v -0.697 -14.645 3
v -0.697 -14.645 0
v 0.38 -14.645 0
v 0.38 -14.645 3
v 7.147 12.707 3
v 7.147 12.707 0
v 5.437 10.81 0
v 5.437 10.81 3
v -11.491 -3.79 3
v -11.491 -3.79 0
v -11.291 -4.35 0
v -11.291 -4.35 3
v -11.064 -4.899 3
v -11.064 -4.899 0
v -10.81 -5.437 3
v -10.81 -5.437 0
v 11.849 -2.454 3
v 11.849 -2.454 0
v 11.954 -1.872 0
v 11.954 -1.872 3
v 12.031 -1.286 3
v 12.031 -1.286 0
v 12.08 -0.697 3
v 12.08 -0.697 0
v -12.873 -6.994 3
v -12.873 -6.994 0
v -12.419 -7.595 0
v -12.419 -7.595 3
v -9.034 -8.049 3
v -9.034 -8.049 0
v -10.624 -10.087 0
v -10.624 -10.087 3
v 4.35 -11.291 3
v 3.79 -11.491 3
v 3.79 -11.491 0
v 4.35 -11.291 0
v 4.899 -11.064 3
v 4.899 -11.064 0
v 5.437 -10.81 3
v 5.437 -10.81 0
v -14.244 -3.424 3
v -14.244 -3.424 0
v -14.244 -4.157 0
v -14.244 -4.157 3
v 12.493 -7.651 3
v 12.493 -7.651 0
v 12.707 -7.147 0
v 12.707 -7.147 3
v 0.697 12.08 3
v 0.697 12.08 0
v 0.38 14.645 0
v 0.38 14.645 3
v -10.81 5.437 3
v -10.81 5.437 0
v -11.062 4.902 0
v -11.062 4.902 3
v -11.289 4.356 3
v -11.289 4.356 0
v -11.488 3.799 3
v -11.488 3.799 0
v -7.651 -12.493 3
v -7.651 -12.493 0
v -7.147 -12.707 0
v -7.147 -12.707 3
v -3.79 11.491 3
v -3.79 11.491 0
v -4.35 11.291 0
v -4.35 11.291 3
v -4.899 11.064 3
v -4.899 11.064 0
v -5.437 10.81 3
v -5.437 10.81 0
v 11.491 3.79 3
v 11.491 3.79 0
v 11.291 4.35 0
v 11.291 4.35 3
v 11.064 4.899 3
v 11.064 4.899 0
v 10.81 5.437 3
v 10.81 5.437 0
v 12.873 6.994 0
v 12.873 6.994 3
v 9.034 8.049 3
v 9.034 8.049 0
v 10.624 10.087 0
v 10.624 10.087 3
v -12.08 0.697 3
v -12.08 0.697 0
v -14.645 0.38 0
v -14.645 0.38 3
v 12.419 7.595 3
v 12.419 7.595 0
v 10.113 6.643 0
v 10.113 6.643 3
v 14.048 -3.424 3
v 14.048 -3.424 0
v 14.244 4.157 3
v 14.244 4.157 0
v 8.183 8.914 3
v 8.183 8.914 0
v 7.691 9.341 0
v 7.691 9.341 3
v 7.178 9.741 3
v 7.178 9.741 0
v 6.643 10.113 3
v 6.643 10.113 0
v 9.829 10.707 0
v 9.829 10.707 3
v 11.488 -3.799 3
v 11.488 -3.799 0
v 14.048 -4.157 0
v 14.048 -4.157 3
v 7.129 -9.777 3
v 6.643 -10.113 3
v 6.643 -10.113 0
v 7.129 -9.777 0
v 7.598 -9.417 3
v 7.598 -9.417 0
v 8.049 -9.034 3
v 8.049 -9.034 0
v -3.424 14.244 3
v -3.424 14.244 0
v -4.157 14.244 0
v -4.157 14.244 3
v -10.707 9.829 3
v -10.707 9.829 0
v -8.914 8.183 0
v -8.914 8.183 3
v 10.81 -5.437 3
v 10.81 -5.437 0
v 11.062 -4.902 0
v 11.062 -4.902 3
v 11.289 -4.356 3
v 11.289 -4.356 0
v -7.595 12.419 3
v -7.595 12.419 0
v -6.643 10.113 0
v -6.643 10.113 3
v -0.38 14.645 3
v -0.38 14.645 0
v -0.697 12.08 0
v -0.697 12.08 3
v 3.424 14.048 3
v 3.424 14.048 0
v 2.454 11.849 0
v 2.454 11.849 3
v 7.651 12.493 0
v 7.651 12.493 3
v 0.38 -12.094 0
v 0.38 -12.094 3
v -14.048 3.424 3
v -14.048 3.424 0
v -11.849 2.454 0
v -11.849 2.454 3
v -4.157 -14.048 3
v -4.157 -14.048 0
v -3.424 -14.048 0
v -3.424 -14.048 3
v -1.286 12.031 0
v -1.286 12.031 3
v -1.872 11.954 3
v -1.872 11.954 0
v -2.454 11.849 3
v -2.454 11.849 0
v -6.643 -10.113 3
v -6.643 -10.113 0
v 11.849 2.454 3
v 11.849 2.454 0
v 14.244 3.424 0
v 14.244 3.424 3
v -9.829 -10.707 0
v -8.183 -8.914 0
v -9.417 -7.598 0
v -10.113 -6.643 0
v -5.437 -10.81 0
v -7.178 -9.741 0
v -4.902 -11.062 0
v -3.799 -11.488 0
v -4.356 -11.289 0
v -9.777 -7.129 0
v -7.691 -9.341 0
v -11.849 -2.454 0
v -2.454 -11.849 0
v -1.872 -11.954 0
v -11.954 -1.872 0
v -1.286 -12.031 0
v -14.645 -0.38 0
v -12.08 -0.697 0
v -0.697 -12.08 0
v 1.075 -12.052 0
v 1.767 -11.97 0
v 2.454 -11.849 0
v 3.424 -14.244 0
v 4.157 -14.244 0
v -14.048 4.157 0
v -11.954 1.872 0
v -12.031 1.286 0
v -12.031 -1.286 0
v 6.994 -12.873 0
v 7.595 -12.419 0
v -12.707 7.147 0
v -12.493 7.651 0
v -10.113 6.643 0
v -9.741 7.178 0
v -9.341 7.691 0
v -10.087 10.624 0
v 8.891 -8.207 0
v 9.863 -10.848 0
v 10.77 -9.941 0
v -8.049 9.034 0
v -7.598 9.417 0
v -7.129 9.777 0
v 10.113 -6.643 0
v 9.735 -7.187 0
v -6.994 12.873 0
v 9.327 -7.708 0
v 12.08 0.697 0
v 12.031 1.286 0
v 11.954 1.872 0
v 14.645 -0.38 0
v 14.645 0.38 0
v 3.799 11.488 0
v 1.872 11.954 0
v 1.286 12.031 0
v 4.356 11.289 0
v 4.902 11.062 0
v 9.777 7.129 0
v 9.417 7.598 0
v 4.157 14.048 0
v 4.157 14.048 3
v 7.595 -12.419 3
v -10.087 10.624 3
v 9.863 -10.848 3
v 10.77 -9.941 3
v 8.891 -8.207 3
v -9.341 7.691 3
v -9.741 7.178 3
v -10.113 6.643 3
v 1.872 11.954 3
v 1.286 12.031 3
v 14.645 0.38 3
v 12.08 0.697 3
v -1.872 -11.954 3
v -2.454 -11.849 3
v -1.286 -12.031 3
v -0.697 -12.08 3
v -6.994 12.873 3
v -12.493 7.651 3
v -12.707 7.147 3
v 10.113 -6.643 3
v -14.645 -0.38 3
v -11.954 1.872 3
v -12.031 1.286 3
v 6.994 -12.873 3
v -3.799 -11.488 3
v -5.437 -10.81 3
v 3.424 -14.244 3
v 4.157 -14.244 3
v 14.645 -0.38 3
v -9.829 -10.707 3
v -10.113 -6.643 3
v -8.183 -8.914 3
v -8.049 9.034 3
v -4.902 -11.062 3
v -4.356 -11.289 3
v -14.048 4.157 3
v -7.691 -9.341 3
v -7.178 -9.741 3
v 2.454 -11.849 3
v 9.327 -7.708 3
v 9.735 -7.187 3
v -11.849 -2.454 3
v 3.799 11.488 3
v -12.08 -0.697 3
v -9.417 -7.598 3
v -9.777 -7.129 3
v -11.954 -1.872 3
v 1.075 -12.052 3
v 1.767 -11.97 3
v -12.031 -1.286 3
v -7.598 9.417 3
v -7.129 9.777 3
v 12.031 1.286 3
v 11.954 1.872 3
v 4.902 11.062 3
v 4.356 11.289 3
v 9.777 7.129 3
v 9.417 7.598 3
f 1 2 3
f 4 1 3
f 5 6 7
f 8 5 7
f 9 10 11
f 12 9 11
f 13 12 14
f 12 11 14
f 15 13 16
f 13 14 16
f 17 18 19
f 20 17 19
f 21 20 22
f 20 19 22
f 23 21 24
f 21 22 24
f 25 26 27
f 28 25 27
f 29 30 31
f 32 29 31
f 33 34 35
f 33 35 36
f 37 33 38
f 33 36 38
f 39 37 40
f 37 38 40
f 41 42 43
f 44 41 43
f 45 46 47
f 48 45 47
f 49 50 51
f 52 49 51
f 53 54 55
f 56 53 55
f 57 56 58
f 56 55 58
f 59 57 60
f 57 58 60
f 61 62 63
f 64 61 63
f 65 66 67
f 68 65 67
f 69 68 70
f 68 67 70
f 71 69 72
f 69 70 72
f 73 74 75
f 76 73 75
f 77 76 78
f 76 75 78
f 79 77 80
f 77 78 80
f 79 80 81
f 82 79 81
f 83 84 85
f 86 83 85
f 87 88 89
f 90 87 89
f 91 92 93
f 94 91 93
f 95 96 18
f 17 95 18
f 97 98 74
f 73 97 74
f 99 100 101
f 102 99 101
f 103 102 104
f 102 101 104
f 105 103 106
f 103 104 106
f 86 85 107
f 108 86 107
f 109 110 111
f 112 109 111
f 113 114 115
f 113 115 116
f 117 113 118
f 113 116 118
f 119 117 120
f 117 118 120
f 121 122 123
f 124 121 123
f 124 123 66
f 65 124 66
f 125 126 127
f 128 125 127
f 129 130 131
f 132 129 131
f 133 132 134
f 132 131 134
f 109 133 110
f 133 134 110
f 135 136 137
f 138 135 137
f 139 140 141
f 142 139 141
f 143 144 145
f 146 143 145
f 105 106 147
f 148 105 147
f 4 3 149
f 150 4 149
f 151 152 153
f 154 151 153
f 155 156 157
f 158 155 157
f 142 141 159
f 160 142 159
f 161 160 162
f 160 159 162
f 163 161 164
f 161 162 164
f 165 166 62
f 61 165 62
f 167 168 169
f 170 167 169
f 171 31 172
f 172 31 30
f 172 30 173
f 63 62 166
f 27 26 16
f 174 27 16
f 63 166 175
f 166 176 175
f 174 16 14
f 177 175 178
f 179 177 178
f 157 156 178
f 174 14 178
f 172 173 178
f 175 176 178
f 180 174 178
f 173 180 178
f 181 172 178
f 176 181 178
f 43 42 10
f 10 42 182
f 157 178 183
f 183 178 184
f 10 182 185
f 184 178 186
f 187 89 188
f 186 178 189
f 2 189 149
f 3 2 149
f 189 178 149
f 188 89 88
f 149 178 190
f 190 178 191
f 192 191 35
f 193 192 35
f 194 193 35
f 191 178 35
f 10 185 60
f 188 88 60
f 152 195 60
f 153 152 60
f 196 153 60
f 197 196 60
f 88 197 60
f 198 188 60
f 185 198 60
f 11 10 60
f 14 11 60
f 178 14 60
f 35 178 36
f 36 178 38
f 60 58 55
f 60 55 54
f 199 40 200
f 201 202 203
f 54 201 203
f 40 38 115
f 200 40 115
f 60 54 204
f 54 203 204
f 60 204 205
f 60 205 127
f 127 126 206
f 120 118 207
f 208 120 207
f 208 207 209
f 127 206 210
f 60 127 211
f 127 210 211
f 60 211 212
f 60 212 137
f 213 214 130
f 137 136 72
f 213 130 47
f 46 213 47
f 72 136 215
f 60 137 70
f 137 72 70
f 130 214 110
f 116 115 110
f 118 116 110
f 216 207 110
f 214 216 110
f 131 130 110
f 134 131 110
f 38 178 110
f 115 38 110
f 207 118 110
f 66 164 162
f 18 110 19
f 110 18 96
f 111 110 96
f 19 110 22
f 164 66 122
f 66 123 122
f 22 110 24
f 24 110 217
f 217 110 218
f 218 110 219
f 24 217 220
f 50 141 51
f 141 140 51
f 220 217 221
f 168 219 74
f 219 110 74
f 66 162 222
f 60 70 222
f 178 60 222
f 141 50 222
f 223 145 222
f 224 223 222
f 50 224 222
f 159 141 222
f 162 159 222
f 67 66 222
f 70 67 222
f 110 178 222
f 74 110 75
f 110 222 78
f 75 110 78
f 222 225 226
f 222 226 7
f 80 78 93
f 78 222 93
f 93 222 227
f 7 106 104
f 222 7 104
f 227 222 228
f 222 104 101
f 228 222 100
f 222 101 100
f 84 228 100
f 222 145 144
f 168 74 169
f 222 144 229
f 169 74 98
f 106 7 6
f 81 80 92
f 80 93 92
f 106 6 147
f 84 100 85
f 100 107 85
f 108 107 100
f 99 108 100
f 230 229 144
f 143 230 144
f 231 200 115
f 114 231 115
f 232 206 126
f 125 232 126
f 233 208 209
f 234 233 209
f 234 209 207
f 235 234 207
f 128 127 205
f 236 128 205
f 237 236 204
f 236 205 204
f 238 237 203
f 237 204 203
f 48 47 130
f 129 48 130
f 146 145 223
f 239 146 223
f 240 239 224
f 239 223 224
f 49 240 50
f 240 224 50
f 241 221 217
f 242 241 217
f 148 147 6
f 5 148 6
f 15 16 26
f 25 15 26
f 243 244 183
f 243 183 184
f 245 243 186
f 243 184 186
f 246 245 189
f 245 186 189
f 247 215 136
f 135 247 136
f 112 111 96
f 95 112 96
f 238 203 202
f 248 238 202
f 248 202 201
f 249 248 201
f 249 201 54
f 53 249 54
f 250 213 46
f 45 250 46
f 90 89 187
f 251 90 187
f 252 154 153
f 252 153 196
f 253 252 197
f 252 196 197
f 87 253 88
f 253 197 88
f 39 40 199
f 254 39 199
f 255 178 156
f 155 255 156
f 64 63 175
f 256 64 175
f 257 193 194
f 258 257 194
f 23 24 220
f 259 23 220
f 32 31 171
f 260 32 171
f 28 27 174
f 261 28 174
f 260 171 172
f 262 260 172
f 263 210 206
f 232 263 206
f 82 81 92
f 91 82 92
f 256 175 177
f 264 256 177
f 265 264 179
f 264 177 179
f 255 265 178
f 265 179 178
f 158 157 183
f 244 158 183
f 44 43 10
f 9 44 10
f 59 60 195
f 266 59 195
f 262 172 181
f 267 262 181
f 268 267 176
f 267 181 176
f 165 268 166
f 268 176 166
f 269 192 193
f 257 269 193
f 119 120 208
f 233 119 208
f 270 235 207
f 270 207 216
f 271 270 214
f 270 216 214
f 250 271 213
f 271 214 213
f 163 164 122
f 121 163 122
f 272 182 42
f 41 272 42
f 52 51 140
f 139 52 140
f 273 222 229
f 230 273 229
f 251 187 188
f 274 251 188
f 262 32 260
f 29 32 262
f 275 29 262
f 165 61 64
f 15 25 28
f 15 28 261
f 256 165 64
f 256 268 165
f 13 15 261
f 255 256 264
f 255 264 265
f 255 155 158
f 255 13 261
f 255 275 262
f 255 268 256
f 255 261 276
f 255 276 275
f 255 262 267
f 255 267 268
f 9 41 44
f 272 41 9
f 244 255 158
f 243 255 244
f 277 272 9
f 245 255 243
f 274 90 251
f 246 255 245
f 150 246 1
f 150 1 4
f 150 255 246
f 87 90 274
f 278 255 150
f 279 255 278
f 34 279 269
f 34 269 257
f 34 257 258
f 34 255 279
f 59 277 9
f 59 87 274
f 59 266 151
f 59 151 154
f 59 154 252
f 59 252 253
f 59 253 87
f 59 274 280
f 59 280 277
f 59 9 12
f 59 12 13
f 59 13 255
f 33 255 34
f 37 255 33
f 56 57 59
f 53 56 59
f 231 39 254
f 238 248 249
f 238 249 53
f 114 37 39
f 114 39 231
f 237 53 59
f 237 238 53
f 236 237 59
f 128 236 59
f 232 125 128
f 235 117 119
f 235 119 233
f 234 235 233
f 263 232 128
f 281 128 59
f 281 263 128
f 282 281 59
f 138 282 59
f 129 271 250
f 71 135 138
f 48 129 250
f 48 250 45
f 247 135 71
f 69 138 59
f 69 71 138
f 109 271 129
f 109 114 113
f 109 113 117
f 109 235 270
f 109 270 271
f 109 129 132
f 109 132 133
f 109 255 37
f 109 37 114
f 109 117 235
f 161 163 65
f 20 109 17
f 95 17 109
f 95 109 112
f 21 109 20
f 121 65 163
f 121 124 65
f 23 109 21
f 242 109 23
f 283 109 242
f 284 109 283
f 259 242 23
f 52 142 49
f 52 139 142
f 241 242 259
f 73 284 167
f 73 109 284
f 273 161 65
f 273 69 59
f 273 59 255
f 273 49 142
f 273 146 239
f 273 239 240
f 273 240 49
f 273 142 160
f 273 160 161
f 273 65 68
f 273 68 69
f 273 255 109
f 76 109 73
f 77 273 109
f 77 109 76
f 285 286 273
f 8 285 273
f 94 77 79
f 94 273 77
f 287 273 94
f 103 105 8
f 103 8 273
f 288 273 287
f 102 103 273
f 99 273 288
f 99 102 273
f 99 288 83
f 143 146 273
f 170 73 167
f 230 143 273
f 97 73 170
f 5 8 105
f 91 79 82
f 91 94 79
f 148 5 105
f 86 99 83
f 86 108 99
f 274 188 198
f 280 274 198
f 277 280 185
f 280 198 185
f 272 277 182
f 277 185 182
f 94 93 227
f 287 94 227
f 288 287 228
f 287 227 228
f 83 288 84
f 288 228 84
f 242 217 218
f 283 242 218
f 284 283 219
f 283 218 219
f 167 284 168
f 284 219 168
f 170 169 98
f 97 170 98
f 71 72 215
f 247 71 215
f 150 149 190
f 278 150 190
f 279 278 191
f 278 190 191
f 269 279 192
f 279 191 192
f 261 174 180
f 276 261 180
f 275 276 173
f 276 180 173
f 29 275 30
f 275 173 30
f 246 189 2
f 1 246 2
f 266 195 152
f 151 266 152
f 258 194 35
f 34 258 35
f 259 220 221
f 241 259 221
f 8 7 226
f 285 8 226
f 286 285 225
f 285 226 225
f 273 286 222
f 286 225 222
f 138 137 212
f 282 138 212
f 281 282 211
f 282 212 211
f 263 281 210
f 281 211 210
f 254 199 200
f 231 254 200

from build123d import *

# Parameters (mm, degrees)
SKETCH1_R            = 12.1
BOSS_EXTRUDE1_DEPTH  = 3
BOSS_EXTRUDE2_DEPTH  = 3
BOSS_EXTRUDE3_DEPTH  = 3
BOSS_EXTRUDE4_DEPTH  = 3
BOSS_EXTRUDE5_DEPTH  = 3
BOSS_EXTRUDE6_DEPTH  = 3
BOSS_EXTRUDE7_DEPTH  = 3
BOSS_EXTRUDE8_DEPTH  = 3
BOSS_EXTRUDE9_DEPTH  = 3
BOSS_EXTRUDE10_DEPTH = 3
BOSS_EXTRUDE11_DEPTH = 3
BOSS_EXTRUDE12_DEPTH = 3
BOSS_EXTRUDE13_DEPTH = 3
BOSS_EXTRUDE14_DEPTH = 3
BOSS_EXTRUDE15_DEPTH = 3
BOSS_EXTRUDE16_DEPTH = 3
BOSS_EXTRUDE17_DEPTH = 3
BOSS_EXTRUDE18_DEPTH = 3
BOSS_EXTRUDE19_DEPTH = 3
BOSS_EXTRUDE20_DEPTH = 3
BOSS_EXTRUDE21_DEPTH = 3
BOSS_EXTRUDE22_DEPTH = 3
BOSS_EXTRUDE23_DEPTH = 3
BOSS_EXTRUDE24_DEPTH = 3
BOSS_EXTRUDE25_DEPTH = 3


with BuildPart() as part:
    # Sketch1 → Boss-Extrude1 (new body)
    with BuildSketch(Plane.XY):
        Circle(SKETCH1_R)
    extrude(amount=BOSS_EXTRUDE1_DEPTH)

    # Sketch2 → Boss-Extrude2 (add)
    with BuildSketch(Plane.XY):
        Polygon((12.079935981, -0.696524726), (14.645079707, -0.379658233), (14.645079707, 0.379658233), (12.079935981, 0.696524726), align=None)
    extrude(amount=BOSS_EXTRUDE2_DEPTH)

    # Sketch3 → Boss-Extrude3 (add)
    with BuildSketch(Plane.XY):
        Polygon((11.848596009, 2.453726274), (14.244323498, 3.423703853), (14.244323498, 4.157147238), (11.490982299, 3.790425545), align=None)
    extrude(amount=BOSS_EXTRUDE3_DEPTH)

    # Sketch4 → Boss-Extrude4 (add)
    with BuildSketch(Plane.XY):
        Polygon((10.809793799, 5.436759883), (12.872840183, 6.993746179), (12.418878698, 7.595256676), (10.113269073, 6.643176098), align=None)
    extrude(amount=BOSS_EXTRUDE4_DEPTH)

    # Sketch5 → Boss-Extrude5 (add)
    with BuildSketch(Plane.XY):
        Polygon((9.034322006, 8.049287291), (10.624094083, 10.087176261), (9.829208044, 10.707272668), (8.182693208, 8.913671065), align=None)
    extrude(amount=BOSS_EXTRUDE5_DEPTH)

    # Sketch6 → Boss-Extrude6 (add)
    with BuildSketch(Plane.XY):
        Polygon((6.643176098, 10.113269073), (7.651333528, 12.49318195), (7.147254813, 12.706715272), (5.436759883, 10.809793799), align=None)
    extrude(amount=BOSS_EXTRUDE6_DEPTH)

    # Sketch7 → Boss-Extrude7 (add)
    with BuildSketch(Plane.XY):
        Polygon((3.799308717, 11.488048279), (4.157147238, 14.047797936), (3.423703853, 14.047797936), (2.453726274, 11.848596009), align=None)
    extrude(amount=BOSS_EXTRUDE7_DEPTH)

    # Sketch8 → Boss-Extrude8 (add)
    with BuildSketch(Plane.XY):
        Polygon((0.696524726, 12.079935981), (0.379658233, 14.645079707), (-0.379658233, 14.645079707), (-0.696524726, 12.079935981), align=None)
    extrude(amount=BOSS_EXTRUDE8_DEPTH)

    # Sketch9 → Boss-Extrude9 (add)
    with BuildSketch(Plane.XY):
        Polygon((-2.453726274, 11.848596009), (-3.423703853, 14.244323498), (-4.157147238, 14.244323498), (-3.790425545, 11.490982299), align=None)
    extrude(amount=BOSS_EXTRUDE9_DEPTH)

    # Sketch10 → Boss-Extrude10 (add)
    with BuildSketch(Plane.XY):
        Polygon((-5.436759883, 10.809793799), (-6.993746179, 12.872840183), (-7.595256676, 12.418878698), (-6.643176098, 10.113269073), align=None)
    extrude(amount=BOSS_EXTRUDE10_DEPTH)

    # Sketch11 → Boss-Extrude11 (add)
    with BuildSketch(Plane.XY):
        Polygon((-8.049287291, 9.034322006), (-10.087176261, 10.624094083), (-10.707272668, 9.829208044), (-8.913671065, 8.182693208), align=None)
    extrude(amount=BOSS_EXTRUDE11_DEPTH)

    # Sketch12 → Boss-Extrude12 (add)
    with BuildSketch(Plane.XY):
        Polygon((-10.113269073, 6.643176098), (-12.49318195, 7.651333528), (-12.706715272, 7.147254813), (-10.809793799, 5.436759883), align=None)
    extrude(amount=BOSS_EXTRUDE12_DEPTH)

    # Sketch13 → Boss-Extrude13 (add)
    with BuildSketch(Plane.XY):
        Polygon((-11.488048279, 3.799308717), (-14.047797936, 4.157147238), (-14.047797936, 3.423703853), (-11.848596009, 2.453726274), align=None)
    extrude(amount=BOSS_EXTRUDE13_DEPTH)

    # Sketch14 → Boss-Extrude14 (add)
    with BuildSketch(Plane.XY):
        Polygon((-12.079935981, 0.696524726), (-14.645079707, 0.379658233), (-14.645079707, -0.379658233), (-12.079935981, -0.696524726), align=None)
    extrude(amount=BOSS_EXTRUDE14_DEPTH)

    # Sketch15 → Boss-Extrude15 (add)
    with BuildSketch(Plane.XY):
        Polygon((-11.848596009, -2.453726274), (-14.244323498, -3.423703853), (-14.244323498, -4.157147238), (-11.490982299, -3.790425545), align=None)
    extrude(amount=BOSS_EXTRUDE15_DEPTH)

    # Sketch16 → Boss-Extrude16 (add)
    with BuildSketch(Plane.XY):
        Polygon((-10.809793799, -5.436759883), (-12.872840183, -6.993746179), (-12.418878698, -7.595256676), (-10.113269073, -6.643176098), align=None)
    extrude(amount=BOSS_EXTRUDE16_DEPTH)

    # Sketch17 → Boss-Extrude17 (add)
    with BuildSketch(Plane.XY):
        Polygon((-9.034322006, -8.049287291), (-10.624094083, -10.087176261), (-9.829208044, -10.707272668), (-8.182693208, -8.913671065), align=None)
    extrude(amount=BOSS_EXTRUDE17_DEPTH)

    # Sketch18 → Boss-Extrude18 (add)
    with BuildSketch(Plane.XY):
        Polygon((-6.643176098, -10.113269073), (-7.651333528, -12.49318195), (-7.147254813, -12.706715272), (-5.436759883, -10.809793799), align=None)
    extrude(amount=BOSS_EXTRUDE18_DEPTH)

    # Sketch19 → Boss-Extrude19 (add)
    with BuildSketch(Plane.XY):
        Polygon((-3.799308717, -11.488048279), (-4.157147238, -14.047797936), (-3.423703853, -14.047797936), (-2.453726274, -11.848596009), align=None)
    extrude(amount=BOSS_EXTRUDE19_DEPTH)

    # Sketch20 → Boss-Extrude20 (add)
    with BuildSketch(Plane.XY):
        Polygon((-0.696524726, -12.079935981), (-0.696524726, -14.645079707), (0.379658233, -14.645079707), (0.379658233, -12.09404232), align=None)
    extrude(amount=BOSS_EXTRUDE20_DEPTH)

    # Sketch21 → Boss-Extrude21 (add)
    with BuildSketch(Plane.XY):
        Polygon((2.453726274, -11.848596009), (3.423703853, -14.244323498), (4.157147238, -14.244323498), (3.790425545, -11.490982299), align=None)
    extrude(amount=BOSS_EXTRUDE21_DEPTH)

    # Sketch22 → Boss-Extrude22 (add)
    with BuildSketch(Plane.XY):
        Polygon((5.436759883, -10.809793799), (6.993746179, -12.872840183), (7.595256676, -12.418878698), (6.643176098, -10.113269073), align=None)
    extrude(amount=BOSS_EXTRUDE22_DEPTH)

    # Sketch23 → Boss-Extrude23 (add)
    with BuildSketch(Plane.XY):
        Polygon((8.049287291, -9.034322006), (9.863117815, -10.848152529), (10.770033076, -9.941237267), (8.89125817, -8.207041376), align=None)
    extrude(amount=BOSS_EXTRUDE23_DEPTH)

    # Sketch24 → Boss-Extrude24 (add)
    with BuildSketch(Plane.XY):
        Polygon((10.113269073, -6.643176098), (12.49318195, -7.651333528), (12.706715272, -7.147254813), (10.809793799, -5.436759883), align=None)
    extrude(amount=BOSS_EXTRUDE24_DEPTH)

    # Sketch25 → Boss-Extrude25 (add)
    with BuildSketch(Plane.XY):
        Polygon((11.488048279, -3.799308717), (14.047797936, -4.157147238), (14.047797936, -3.423703853), (11.848596009, -2.453726274), align=None)
    extrude(amount=BOSS_EXTRUDE25_DEPTH)


solid = part.part
